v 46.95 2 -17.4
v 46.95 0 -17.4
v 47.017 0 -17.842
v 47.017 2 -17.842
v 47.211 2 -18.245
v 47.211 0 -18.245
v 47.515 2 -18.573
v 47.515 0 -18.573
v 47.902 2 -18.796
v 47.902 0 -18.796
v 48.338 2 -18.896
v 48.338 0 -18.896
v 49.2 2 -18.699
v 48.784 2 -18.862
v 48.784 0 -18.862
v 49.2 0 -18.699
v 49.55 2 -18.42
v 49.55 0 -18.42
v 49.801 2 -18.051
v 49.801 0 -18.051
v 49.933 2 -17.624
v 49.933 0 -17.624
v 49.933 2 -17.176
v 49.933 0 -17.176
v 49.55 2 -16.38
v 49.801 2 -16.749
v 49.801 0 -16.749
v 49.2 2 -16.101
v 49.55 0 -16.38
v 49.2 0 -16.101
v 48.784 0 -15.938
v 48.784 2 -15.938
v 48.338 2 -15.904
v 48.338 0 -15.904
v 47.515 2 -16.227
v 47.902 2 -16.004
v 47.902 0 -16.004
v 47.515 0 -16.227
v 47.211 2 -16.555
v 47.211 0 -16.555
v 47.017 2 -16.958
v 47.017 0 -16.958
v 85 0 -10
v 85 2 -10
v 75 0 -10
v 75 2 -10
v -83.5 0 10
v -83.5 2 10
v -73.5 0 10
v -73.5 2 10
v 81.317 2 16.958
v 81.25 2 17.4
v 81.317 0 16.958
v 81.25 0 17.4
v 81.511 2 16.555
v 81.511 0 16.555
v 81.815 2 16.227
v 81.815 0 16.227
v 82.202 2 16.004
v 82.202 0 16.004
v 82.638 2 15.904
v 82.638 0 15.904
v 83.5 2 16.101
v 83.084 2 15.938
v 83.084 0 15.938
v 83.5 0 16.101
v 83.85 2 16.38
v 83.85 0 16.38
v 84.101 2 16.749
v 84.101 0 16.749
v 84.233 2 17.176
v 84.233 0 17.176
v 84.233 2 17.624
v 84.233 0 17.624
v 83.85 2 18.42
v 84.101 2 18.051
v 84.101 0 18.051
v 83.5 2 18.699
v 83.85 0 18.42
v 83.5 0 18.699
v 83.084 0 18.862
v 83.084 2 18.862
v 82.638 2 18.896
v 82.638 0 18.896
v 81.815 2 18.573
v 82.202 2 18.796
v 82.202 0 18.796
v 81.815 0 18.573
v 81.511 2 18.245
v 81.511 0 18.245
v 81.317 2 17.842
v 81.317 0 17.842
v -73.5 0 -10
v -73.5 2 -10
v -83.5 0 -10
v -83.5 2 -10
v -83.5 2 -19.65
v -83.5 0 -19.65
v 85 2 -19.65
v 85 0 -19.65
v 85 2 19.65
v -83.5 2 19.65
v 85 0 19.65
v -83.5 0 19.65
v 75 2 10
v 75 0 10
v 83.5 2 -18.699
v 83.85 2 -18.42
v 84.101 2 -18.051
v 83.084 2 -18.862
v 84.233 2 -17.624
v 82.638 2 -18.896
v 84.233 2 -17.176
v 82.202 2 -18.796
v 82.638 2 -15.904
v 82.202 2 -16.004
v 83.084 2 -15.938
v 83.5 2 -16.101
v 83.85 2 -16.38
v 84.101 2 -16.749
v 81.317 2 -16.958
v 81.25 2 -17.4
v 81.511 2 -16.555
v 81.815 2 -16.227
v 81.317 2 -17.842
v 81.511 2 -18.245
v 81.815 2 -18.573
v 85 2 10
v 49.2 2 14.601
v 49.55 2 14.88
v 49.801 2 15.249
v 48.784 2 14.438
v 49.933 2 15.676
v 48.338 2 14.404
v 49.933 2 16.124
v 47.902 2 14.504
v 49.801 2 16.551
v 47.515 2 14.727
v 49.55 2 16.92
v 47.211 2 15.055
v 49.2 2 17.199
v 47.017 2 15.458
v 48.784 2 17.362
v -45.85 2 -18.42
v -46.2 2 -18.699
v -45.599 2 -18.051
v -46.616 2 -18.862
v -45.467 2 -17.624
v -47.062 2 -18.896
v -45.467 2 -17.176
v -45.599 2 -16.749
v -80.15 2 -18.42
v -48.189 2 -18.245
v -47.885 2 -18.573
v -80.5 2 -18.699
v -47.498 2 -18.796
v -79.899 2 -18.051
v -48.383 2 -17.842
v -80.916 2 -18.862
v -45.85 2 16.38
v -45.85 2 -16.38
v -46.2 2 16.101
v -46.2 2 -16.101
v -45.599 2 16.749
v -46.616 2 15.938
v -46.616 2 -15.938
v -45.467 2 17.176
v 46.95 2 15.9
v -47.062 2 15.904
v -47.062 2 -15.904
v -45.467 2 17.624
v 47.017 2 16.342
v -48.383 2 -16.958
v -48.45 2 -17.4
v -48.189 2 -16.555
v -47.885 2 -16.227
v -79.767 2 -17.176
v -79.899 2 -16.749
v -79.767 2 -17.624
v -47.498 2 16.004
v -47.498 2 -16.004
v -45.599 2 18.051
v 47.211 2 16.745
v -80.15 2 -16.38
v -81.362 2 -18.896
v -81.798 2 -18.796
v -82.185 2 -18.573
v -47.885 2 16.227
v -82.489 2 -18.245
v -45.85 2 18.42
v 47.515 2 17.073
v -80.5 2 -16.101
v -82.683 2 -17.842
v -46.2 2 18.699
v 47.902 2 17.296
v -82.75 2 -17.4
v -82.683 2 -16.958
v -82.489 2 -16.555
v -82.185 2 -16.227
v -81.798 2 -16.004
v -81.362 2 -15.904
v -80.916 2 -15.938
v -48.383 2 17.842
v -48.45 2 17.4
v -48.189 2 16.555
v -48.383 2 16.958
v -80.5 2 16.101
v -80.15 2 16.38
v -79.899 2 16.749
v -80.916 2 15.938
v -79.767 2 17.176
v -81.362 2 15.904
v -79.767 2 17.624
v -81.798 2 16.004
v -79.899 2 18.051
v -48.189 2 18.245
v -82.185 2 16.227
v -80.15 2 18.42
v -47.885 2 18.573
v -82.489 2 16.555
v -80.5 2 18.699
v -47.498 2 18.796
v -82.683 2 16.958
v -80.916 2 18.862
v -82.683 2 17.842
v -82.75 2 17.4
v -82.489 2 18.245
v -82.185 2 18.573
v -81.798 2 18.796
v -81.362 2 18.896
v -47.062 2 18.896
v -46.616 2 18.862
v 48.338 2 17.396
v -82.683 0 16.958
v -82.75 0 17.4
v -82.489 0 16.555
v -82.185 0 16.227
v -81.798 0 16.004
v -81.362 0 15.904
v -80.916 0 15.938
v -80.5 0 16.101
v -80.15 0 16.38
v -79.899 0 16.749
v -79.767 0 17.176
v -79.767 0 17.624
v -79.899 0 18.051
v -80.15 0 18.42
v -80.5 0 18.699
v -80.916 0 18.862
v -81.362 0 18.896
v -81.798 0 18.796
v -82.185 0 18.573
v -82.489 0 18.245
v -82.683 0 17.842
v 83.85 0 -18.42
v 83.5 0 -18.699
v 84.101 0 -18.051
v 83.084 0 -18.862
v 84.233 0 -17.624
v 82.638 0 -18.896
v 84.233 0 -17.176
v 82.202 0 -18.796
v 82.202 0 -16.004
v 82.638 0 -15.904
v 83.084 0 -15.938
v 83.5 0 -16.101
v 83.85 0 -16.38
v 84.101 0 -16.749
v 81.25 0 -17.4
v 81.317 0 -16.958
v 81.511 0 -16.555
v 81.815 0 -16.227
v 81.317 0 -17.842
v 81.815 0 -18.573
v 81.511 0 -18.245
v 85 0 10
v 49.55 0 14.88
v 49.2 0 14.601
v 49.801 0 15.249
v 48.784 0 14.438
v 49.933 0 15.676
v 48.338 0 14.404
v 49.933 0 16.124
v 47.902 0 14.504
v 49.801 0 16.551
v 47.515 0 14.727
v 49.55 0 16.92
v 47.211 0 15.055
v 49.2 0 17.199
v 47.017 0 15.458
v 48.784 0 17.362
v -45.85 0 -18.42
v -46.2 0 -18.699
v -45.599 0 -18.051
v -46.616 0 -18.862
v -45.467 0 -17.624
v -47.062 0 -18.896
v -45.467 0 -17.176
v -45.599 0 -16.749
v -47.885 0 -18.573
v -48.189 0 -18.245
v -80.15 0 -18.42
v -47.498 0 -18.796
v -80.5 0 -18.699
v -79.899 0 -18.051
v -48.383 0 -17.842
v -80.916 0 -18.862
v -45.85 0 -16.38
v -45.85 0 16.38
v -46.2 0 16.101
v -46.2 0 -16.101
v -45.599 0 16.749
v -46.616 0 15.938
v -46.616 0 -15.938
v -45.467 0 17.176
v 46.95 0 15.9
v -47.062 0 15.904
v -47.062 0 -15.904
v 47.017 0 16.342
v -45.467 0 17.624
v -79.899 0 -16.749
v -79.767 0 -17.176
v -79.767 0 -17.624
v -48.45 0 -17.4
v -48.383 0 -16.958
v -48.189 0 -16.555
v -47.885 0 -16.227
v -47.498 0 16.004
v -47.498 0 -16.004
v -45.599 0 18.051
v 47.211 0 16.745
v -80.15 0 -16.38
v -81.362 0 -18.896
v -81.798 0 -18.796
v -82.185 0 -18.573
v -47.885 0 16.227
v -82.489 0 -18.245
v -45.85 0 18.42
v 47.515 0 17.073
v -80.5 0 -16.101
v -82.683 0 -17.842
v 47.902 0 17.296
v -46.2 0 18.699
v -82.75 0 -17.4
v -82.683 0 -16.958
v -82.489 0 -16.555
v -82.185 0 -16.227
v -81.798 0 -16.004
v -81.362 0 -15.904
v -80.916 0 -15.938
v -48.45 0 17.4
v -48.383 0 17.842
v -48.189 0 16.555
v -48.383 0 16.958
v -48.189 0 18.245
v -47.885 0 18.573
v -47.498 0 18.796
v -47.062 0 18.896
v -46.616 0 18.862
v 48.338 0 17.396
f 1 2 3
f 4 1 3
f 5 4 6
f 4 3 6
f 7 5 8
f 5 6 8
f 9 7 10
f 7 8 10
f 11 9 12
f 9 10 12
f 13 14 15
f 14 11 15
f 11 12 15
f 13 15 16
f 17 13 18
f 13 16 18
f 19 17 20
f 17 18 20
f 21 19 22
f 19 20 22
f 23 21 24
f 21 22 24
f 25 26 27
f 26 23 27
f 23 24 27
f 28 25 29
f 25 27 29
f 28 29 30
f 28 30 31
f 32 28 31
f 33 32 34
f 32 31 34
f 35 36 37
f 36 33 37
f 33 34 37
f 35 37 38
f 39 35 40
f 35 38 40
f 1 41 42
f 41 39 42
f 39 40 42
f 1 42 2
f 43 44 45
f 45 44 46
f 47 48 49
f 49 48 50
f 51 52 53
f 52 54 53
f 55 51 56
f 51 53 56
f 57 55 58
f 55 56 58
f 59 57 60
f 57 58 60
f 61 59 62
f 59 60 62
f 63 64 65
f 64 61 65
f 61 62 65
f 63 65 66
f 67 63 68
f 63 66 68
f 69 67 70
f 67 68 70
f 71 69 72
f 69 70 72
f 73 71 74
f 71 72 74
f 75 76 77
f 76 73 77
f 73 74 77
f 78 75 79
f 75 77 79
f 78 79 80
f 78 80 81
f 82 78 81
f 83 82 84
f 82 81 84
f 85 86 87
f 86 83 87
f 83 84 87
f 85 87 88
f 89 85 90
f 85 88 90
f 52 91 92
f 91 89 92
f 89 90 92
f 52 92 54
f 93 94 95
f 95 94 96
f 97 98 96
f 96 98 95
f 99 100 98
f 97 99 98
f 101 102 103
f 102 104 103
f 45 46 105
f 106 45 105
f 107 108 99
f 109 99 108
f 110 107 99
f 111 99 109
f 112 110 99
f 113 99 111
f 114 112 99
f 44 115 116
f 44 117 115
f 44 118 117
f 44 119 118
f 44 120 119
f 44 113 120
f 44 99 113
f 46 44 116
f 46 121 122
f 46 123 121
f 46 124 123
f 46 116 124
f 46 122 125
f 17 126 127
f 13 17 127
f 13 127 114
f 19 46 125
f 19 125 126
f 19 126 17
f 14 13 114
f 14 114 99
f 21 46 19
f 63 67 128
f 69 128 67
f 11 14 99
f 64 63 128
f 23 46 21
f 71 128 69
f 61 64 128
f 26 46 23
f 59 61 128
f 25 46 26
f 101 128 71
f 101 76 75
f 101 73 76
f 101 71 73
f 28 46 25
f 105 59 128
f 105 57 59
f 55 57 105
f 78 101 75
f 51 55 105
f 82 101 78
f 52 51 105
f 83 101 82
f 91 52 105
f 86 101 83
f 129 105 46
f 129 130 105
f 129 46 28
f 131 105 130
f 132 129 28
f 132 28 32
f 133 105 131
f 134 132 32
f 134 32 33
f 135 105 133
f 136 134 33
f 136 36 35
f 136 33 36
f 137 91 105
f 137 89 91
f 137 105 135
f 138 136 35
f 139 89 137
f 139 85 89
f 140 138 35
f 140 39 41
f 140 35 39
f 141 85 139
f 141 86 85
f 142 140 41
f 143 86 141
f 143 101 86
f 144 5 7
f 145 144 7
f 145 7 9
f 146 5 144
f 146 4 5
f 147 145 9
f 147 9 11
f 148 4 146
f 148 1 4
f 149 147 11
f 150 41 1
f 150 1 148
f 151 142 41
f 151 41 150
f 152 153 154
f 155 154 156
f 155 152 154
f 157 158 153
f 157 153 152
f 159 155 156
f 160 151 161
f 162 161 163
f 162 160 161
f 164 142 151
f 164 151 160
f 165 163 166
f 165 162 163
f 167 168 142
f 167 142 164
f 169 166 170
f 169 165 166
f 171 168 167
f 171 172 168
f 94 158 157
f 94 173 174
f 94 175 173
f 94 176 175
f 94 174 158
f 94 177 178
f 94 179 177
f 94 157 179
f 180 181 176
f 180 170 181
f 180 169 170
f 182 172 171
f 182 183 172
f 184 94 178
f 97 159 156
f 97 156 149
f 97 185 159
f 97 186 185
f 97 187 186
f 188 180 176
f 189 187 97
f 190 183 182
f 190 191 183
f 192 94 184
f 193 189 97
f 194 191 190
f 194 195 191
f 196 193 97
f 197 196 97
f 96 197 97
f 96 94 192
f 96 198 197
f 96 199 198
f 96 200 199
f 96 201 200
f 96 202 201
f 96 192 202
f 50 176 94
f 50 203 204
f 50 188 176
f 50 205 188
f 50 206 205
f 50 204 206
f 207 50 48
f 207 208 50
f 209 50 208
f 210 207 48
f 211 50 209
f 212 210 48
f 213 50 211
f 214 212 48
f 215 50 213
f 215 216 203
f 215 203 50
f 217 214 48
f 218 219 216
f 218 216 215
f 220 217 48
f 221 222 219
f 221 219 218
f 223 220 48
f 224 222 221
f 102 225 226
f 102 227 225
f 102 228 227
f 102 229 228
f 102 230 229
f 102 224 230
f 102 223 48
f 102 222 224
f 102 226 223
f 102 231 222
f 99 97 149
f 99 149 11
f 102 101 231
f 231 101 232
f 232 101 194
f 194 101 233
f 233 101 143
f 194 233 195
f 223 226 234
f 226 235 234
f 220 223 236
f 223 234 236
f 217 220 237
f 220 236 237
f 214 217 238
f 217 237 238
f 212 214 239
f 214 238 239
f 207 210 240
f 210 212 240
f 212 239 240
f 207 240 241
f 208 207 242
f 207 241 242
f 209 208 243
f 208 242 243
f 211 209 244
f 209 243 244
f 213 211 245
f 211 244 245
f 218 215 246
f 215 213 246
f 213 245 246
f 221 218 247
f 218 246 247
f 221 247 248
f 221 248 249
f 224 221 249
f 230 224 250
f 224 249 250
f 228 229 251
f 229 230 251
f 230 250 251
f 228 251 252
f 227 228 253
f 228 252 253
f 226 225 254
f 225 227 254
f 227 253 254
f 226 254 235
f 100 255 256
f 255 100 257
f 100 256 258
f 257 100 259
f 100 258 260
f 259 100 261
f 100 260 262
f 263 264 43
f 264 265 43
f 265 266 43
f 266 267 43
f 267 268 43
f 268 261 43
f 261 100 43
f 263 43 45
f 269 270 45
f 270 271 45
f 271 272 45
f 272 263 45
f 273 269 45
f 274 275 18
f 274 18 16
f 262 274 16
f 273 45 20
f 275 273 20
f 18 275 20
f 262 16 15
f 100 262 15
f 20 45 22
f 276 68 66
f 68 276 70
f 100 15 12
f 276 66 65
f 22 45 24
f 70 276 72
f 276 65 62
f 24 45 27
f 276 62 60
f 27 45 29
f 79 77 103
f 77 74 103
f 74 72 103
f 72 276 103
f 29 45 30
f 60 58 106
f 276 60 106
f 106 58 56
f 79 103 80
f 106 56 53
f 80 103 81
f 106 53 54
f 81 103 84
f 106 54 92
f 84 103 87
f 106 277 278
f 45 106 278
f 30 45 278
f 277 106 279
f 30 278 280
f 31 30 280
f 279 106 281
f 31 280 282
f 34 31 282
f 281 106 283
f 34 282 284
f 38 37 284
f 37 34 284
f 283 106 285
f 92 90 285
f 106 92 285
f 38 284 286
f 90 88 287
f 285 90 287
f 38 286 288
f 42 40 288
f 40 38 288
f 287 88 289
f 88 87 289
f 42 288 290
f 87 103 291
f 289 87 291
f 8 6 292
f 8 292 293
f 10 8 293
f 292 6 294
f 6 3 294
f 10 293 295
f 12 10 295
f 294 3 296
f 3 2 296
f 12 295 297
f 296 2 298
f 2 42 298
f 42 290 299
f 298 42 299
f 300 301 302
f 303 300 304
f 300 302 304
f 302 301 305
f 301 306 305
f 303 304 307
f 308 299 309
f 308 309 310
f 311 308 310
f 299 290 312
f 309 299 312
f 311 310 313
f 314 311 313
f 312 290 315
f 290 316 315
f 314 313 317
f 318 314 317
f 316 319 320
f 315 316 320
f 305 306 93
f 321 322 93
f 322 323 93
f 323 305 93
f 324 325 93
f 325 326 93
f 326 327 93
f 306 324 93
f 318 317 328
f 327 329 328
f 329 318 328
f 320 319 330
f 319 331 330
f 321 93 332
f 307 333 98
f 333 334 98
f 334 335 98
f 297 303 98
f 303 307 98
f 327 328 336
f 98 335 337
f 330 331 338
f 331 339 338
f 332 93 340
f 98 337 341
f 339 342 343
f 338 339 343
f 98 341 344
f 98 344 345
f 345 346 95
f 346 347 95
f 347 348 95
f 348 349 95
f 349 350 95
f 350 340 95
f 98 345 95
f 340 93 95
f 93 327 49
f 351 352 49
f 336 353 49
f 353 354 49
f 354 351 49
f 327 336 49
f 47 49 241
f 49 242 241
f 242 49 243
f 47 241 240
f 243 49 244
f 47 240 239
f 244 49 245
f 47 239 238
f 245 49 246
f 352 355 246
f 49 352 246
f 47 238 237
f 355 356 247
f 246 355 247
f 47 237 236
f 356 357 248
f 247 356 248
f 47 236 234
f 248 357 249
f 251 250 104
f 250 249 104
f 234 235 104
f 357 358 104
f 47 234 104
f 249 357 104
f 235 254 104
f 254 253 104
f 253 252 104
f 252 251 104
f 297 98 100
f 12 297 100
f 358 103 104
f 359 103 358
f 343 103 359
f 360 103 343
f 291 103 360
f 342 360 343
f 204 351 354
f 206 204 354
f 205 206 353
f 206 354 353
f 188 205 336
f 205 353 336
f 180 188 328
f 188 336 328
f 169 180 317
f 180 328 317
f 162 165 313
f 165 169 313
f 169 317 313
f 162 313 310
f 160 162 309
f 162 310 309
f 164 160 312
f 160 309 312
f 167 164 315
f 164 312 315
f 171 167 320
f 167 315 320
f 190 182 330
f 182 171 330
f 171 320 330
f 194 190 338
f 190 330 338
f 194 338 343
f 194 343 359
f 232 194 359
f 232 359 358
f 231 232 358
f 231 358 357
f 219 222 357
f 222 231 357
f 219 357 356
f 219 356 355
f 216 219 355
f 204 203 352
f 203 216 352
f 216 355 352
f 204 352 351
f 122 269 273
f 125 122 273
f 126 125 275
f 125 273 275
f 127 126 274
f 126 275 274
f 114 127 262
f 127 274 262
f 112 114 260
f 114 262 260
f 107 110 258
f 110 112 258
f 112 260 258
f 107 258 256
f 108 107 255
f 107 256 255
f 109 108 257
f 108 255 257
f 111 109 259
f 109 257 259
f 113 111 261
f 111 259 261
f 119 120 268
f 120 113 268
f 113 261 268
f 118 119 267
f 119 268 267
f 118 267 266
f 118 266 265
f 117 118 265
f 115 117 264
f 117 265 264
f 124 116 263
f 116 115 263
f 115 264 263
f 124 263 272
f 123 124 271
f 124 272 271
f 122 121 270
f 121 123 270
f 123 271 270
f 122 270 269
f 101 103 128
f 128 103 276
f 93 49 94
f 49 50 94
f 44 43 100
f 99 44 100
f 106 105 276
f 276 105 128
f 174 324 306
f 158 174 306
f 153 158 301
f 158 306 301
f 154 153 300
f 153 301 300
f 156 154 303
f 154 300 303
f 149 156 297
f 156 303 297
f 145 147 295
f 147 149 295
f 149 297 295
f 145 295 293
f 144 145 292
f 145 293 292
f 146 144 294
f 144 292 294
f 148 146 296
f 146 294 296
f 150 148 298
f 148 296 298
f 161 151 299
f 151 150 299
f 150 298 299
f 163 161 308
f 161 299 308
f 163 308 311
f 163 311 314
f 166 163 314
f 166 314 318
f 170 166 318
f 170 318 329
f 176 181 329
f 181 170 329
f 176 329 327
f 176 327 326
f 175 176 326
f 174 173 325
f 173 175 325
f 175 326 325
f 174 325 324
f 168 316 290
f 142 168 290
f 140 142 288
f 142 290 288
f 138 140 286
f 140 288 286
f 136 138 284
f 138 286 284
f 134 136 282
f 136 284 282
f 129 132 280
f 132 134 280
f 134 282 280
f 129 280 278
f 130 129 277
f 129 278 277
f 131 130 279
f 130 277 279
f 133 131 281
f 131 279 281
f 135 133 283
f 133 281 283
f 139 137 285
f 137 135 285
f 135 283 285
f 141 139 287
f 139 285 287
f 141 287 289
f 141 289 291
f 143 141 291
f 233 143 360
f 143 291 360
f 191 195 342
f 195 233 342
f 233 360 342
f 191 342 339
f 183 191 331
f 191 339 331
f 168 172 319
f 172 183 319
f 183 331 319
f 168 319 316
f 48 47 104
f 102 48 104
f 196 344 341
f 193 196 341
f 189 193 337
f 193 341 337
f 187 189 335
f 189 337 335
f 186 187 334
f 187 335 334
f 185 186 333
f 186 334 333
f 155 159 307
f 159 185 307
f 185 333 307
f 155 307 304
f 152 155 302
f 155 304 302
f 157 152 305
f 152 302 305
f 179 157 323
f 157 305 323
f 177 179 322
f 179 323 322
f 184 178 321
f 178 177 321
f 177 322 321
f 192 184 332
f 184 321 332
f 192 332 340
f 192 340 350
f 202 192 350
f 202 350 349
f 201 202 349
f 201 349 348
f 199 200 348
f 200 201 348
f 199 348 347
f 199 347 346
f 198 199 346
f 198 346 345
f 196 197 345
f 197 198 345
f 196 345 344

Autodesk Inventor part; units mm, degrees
ref_plane "YZ Plane" through (0, 0, 0) normal (1, 0, 0) x (0, 1, 0)
ref_plane "XZ Plane" through (0, 0, 0) normal (0, 1, 0) x (-1, 0, 0)
ref_plane "XY Plane" through (0, 0, 0) normal (0, 0, 1) x (1, 0, 0)
sketch "Sketch1" plane through (0, 0, 0) normal (0, 1, 0) x (-1, 0, 0)
  line L0 (83.5, 19.65) -> (-85, 19.65)
  line L1 (-85, 19.65) -> (-85, -19.65)
  line L2 (-85, -19.65) -> (83.5, -19.65)
  line L3 (83.5, -19.65) -> (83.5, 19.65)
  line L4 (19.05, 0) -> (-17.4625, 0) construction
  line L5 (-0.75, 11.1125) -> (-0.75, -12.7) construction
  circle A0 centre (-82.75, 17.4) radius 1.5
  circle A1 centre (-82.75, -17.4) radius 1.5
  circle A2 centre (81.25, 17.4) radius 1.5
  circle A3 centre (81.25, -17.4) radius 1.5
  circle A4 centre (46.95, 17.4) radius 1.5
  circle A5 centre (46.95, -17.4) radius 1.5
  circle A6 centre (-48.45, -17.4) radius 1.5
  circle A7 centre (-48.45, 15.9) radius 1.5
  point P0 (0, 0)
  dimension "d0" = 168.5
  dimension "d1" = 39.3
  dimension "d2" = 3
  dimension "d3" = 2.25
  dimension "d4" = 2.25
  dimension "d7" = 2.25
  dimension "d16" = 3
  dimension "d17" = 34.3
  dimension "d18" = 3
  dimension "d19" = 3
  dimension "d20" = 34.3
  dimension "d21" = 3
extrude "Extrusion1" add sketch "Sketch1" along normal blind 2 contours L3 L2 L1 L0 | A2 | A3 | A4 | A5 | A6 | A7
extrude "Extrusion2" cut sketch "Sketch1" along normal blind 2 contours A2 | A3
sketch "Sketch2" plane through (0, 2, 0) normal (0, 1, 0) x (1, 0, 0)
  line L0 (-93.5, -10) -> (-73.5, -10)
  line L1 (-73.5, -10) -> (-73.5, 10)
  line L2 (-73.5, 10) -> (-93.5, 10)
  line L3 (-93.5, 10) -> (-93.5, -10)
  line L4 (-83.5, 19.65) -> (-83.5, -19.65) projected
  line L5 (-93.5, -10) -> (-73.5, 10) construction
  line L6 (-73.5, -10) -> (-93.5, 10) construction
  line L7 (75, -10) -> (95, -10)
  line L8 (95, -10) -> (95, 10)
  line L9 (95, 10) -> (75, 10)
  line L10 (75, 10) -> (75, -10)
  line L11 (85, -19.65) -> (85, 19.65) projected
  line L12 (75, -10) -> (95, 10) construction
  line L13 (95, -10) -> (75, 10) construction
  point P0 (0, 0)
  point P1 (-83.5, 0)
  point P2 (85, 0)
  point P3 (-83.5, 10)
  point P4 (-83.5, -10)
  point P5 (85, -10)
  point P6 (85, 10)
  dimension "d10" = 20
  dimension "d11" = 20
  dimension "d12" = 20
  dimension "d13" = 20
extrude "Extrusion3" cut sketch "Sketch2" against normal blind 2 contours L4 L2 L1 L0 | L10 L9 L11 L7
sketch "Sketch3" plane through (0, 2, 0) normal (0, 1, 0) x (1, 0, 0)
  point P0 (0, 0)
extrude "Extrusion4" cut sketch "Sketch1" along normal blind 2 contours A4 | A5 | A6 | A7
properties part number "Casis Tengah_3DPrint"
